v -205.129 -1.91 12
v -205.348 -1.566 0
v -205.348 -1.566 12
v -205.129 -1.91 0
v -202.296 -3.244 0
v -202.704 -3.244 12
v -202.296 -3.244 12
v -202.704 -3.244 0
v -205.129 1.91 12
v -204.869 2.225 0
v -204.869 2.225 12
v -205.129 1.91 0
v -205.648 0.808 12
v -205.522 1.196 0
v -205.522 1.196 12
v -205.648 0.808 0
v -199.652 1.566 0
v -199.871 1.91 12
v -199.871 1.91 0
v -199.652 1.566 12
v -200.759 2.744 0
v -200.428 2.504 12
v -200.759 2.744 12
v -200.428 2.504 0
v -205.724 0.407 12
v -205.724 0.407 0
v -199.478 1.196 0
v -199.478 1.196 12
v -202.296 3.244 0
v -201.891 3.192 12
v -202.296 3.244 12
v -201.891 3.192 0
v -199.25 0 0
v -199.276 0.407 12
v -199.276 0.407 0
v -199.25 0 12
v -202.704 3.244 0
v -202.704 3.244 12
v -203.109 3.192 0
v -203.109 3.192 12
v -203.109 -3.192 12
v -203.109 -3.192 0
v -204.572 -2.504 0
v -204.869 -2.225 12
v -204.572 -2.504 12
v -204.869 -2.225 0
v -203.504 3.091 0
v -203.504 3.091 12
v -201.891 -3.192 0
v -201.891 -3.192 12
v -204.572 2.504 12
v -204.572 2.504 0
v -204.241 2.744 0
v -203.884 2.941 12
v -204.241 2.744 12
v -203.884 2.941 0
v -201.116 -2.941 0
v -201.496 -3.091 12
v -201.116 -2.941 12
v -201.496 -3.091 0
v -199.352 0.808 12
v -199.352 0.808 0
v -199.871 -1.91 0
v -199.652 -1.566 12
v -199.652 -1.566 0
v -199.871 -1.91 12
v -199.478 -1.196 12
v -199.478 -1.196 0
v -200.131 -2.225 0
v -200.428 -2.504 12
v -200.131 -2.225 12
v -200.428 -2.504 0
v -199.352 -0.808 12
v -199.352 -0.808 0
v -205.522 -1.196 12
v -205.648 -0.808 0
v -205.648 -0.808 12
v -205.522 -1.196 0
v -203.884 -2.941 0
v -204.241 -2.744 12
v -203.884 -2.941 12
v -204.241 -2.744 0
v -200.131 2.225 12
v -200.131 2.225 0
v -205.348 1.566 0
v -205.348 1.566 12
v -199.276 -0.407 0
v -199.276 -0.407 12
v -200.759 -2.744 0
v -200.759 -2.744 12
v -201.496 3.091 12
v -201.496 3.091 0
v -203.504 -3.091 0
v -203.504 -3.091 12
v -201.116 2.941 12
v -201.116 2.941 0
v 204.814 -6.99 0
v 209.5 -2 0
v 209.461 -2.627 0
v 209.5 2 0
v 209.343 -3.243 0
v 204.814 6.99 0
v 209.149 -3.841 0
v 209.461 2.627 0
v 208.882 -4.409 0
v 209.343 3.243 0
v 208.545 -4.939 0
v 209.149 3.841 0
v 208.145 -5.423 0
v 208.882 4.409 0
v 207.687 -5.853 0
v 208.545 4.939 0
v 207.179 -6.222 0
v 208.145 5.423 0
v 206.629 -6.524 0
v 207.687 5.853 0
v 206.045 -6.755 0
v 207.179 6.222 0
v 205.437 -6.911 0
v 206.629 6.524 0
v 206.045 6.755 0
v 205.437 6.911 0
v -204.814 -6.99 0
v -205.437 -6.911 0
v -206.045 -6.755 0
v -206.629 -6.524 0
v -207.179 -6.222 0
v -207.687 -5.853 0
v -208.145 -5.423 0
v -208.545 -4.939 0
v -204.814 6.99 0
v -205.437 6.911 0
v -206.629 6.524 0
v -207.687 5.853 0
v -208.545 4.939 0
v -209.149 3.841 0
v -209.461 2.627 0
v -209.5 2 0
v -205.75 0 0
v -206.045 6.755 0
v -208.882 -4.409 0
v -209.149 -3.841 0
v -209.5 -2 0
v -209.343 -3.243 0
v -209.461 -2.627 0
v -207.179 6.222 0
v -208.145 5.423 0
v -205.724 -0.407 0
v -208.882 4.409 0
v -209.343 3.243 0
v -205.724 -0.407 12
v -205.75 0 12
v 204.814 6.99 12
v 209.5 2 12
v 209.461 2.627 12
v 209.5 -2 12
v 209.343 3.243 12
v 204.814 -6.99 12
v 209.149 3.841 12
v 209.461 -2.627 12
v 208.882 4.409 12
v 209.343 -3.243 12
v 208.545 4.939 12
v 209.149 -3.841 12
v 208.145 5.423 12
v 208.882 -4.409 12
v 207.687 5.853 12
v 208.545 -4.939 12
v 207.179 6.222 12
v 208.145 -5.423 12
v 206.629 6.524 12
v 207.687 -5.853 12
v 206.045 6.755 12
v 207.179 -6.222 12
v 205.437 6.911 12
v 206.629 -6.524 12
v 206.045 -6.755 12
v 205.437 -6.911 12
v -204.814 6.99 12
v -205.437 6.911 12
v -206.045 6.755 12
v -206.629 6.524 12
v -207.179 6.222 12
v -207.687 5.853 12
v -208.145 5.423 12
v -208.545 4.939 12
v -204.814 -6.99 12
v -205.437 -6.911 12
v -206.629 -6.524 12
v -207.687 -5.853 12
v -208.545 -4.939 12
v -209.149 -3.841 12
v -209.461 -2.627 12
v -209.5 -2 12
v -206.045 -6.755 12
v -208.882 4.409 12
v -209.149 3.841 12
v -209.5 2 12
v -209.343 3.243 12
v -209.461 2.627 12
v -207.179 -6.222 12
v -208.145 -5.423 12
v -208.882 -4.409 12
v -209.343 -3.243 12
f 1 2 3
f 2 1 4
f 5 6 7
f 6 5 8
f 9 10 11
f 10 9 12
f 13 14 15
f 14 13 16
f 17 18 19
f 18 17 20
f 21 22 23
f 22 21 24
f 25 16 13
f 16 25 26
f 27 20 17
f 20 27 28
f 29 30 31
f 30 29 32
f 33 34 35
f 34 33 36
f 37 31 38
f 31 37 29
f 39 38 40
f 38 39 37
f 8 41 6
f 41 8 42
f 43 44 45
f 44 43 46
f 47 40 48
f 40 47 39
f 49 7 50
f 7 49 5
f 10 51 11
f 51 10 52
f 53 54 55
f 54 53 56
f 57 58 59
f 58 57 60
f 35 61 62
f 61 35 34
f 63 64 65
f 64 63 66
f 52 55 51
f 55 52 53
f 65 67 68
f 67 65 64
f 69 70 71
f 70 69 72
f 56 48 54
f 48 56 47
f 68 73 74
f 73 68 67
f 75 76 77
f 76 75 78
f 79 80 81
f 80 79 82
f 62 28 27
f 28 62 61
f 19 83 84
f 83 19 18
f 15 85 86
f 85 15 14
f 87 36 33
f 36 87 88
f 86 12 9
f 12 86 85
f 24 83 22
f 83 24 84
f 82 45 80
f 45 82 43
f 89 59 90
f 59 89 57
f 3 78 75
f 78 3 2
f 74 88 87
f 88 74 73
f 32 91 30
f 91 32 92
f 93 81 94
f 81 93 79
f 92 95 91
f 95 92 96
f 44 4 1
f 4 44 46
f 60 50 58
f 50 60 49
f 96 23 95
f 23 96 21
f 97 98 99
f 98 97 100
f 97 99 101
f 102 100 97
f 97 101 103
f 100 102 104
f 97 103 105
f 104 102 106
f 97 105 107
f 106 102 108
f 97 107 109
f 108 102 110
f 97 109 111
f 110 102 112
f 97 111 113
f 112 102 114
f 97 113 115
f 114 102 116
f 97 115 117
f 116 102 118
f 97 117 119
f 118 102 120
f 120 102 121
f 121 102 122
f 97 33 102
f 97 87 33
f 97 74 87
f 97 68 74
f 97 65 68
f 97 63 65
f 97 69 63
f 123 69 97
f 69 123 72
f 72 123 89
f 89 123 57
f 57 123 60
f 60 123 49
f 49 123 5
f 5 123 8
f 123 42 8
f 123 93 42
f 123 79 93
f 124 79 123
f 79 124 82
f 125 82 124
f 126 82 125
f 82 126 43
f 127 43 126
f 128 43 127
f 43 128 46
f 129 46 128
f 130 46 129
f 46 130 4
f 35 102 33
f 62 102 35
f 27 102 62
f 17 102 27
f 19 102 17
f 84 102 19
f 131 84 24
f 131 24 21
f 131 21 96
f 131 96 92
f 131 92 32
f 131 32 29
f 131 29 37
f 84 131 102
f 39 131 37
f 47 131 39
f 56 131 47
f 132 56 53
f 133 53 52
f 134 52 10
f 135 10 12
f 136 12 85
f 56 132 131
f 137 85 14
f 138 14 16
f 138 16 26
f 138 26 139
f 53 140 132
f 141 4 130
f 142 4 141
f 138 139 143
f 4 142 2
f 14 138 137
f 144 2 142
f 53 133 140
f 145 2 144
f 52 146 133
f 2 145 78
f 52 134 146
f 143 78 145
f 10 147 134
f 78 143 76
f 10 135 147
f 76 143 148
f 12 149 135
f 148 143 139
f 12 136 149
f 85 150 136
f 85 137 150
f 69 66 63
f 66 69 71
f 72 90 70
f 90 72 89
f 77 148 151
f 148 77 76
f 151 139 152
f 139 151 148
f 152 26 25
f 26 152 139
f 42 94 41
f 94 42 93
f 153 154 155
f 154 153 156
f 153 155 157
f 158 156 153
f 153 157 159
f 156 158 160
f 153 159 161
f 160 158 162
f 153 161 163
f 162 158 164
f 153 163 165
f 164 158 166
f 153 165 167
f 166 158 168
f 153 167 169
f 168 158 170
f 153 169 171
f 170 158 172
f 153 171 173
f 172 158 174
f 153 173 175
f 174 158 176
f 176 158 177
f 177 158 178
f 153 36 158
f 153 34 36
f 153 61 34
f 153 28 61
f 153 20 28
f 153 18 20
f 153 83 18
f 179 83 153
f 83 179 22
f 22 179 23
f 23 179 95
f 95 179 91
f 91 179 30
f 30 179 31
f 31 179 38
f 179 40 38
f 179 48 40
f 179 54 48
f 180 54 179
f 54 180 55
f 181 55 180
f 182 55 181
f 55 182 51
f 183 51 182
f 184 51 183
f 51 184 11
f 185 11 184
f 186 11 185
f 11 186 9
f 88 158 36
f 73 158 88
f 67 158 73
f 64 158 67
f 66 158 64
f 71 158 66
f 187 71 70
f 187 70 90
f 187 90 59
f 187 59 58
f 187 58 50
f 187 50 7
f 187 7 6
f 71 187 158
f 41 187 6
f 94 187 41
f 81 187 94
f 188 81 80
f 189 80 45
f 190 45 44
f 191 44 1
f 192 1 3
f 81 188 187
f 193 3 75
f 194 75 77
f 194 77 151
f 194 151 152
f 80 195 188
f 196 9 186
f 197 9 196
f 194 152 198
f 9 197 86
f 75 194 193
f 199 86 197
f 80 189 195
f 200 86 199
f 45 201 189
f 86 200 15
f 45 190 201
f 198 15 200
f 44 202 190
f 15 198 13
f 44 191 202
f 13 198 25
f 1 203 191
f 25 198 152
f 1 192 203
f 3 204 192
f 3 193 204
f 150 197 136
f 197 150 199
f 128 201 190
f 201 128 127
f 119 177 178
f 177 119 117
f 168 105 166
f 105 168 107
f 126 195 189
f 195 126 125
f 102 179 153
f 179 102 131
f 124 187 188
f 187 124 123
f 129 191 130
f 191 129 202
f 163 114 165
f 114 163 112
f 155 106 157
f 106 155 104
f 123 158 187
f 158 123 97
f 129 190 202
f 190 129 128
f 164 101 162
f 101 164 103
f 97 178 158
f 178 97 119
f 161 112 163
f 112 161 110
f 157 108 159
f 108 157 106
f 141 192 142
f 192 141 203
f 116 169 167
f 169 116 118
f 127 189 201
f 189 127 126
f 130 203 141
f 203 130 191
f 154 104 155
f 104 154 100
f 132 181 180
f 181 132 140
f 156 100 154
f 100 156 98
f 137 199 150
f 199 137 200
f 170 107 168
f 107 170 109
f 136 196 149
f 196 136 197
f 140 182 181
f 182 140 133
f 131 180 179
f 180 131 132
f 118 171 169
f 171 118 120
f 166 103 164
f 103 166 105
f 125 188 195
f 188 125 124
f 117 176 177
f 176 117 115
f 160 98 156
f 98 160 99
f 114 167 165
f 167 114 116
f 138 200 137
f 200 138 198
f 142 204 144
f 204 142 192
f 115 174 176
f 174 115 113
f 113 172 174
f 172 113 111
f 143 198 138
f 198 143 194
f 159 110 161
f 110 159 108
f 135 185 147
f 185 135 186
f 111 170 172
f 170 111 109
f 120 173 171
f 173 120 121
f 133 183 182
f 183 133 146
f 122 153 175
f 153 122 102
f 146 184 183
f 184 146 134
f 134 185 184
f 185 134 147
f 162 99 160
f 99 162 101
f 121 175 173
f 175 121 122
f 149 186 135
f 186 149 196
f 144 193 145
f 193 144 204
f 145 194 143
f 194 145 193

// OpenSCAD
$fn = 50;


difference() {
	union() {
		hull() {
			translate(v = [-204.5000000000, 2.0000000000, 0]) {
				cylinder(h = 12, r = 5);
			}
			translate(v = [204.5000000000, 2.0000000000, 0]) {
				cylinder(h = 12, r = 5);
			}
			translate(v = [-204.5000000000, -2.0000000000, 0]) {
				cylinder(h = 12, r = 5);
			}
			translate(v = [204.5000000000, -2.0000000000, 0]) {
				cylinder(h = 12, r = 5);
			}
		}
	}
	union() {
		translate(v = [-202.5000000000, 0.0000000000, 0]) {
			cylinder(h = 12, r = 3.2500000000);
		}
		translate(v = [-202.5000000000, 0.0000000000, 0]) {
			cylinder(h = 12, r = 1.8000000000);
		}
		translate(v = [-202.5000000000, 0.0000000000, 0]) {
			cylinder(h = 12, r = 1.8000000000);
		}
		translate(v = [-202.5000000000, 0.0000000000, 0]) {
			cylinder(h = 12, r = 1.8000000000);
		}
	}
}
